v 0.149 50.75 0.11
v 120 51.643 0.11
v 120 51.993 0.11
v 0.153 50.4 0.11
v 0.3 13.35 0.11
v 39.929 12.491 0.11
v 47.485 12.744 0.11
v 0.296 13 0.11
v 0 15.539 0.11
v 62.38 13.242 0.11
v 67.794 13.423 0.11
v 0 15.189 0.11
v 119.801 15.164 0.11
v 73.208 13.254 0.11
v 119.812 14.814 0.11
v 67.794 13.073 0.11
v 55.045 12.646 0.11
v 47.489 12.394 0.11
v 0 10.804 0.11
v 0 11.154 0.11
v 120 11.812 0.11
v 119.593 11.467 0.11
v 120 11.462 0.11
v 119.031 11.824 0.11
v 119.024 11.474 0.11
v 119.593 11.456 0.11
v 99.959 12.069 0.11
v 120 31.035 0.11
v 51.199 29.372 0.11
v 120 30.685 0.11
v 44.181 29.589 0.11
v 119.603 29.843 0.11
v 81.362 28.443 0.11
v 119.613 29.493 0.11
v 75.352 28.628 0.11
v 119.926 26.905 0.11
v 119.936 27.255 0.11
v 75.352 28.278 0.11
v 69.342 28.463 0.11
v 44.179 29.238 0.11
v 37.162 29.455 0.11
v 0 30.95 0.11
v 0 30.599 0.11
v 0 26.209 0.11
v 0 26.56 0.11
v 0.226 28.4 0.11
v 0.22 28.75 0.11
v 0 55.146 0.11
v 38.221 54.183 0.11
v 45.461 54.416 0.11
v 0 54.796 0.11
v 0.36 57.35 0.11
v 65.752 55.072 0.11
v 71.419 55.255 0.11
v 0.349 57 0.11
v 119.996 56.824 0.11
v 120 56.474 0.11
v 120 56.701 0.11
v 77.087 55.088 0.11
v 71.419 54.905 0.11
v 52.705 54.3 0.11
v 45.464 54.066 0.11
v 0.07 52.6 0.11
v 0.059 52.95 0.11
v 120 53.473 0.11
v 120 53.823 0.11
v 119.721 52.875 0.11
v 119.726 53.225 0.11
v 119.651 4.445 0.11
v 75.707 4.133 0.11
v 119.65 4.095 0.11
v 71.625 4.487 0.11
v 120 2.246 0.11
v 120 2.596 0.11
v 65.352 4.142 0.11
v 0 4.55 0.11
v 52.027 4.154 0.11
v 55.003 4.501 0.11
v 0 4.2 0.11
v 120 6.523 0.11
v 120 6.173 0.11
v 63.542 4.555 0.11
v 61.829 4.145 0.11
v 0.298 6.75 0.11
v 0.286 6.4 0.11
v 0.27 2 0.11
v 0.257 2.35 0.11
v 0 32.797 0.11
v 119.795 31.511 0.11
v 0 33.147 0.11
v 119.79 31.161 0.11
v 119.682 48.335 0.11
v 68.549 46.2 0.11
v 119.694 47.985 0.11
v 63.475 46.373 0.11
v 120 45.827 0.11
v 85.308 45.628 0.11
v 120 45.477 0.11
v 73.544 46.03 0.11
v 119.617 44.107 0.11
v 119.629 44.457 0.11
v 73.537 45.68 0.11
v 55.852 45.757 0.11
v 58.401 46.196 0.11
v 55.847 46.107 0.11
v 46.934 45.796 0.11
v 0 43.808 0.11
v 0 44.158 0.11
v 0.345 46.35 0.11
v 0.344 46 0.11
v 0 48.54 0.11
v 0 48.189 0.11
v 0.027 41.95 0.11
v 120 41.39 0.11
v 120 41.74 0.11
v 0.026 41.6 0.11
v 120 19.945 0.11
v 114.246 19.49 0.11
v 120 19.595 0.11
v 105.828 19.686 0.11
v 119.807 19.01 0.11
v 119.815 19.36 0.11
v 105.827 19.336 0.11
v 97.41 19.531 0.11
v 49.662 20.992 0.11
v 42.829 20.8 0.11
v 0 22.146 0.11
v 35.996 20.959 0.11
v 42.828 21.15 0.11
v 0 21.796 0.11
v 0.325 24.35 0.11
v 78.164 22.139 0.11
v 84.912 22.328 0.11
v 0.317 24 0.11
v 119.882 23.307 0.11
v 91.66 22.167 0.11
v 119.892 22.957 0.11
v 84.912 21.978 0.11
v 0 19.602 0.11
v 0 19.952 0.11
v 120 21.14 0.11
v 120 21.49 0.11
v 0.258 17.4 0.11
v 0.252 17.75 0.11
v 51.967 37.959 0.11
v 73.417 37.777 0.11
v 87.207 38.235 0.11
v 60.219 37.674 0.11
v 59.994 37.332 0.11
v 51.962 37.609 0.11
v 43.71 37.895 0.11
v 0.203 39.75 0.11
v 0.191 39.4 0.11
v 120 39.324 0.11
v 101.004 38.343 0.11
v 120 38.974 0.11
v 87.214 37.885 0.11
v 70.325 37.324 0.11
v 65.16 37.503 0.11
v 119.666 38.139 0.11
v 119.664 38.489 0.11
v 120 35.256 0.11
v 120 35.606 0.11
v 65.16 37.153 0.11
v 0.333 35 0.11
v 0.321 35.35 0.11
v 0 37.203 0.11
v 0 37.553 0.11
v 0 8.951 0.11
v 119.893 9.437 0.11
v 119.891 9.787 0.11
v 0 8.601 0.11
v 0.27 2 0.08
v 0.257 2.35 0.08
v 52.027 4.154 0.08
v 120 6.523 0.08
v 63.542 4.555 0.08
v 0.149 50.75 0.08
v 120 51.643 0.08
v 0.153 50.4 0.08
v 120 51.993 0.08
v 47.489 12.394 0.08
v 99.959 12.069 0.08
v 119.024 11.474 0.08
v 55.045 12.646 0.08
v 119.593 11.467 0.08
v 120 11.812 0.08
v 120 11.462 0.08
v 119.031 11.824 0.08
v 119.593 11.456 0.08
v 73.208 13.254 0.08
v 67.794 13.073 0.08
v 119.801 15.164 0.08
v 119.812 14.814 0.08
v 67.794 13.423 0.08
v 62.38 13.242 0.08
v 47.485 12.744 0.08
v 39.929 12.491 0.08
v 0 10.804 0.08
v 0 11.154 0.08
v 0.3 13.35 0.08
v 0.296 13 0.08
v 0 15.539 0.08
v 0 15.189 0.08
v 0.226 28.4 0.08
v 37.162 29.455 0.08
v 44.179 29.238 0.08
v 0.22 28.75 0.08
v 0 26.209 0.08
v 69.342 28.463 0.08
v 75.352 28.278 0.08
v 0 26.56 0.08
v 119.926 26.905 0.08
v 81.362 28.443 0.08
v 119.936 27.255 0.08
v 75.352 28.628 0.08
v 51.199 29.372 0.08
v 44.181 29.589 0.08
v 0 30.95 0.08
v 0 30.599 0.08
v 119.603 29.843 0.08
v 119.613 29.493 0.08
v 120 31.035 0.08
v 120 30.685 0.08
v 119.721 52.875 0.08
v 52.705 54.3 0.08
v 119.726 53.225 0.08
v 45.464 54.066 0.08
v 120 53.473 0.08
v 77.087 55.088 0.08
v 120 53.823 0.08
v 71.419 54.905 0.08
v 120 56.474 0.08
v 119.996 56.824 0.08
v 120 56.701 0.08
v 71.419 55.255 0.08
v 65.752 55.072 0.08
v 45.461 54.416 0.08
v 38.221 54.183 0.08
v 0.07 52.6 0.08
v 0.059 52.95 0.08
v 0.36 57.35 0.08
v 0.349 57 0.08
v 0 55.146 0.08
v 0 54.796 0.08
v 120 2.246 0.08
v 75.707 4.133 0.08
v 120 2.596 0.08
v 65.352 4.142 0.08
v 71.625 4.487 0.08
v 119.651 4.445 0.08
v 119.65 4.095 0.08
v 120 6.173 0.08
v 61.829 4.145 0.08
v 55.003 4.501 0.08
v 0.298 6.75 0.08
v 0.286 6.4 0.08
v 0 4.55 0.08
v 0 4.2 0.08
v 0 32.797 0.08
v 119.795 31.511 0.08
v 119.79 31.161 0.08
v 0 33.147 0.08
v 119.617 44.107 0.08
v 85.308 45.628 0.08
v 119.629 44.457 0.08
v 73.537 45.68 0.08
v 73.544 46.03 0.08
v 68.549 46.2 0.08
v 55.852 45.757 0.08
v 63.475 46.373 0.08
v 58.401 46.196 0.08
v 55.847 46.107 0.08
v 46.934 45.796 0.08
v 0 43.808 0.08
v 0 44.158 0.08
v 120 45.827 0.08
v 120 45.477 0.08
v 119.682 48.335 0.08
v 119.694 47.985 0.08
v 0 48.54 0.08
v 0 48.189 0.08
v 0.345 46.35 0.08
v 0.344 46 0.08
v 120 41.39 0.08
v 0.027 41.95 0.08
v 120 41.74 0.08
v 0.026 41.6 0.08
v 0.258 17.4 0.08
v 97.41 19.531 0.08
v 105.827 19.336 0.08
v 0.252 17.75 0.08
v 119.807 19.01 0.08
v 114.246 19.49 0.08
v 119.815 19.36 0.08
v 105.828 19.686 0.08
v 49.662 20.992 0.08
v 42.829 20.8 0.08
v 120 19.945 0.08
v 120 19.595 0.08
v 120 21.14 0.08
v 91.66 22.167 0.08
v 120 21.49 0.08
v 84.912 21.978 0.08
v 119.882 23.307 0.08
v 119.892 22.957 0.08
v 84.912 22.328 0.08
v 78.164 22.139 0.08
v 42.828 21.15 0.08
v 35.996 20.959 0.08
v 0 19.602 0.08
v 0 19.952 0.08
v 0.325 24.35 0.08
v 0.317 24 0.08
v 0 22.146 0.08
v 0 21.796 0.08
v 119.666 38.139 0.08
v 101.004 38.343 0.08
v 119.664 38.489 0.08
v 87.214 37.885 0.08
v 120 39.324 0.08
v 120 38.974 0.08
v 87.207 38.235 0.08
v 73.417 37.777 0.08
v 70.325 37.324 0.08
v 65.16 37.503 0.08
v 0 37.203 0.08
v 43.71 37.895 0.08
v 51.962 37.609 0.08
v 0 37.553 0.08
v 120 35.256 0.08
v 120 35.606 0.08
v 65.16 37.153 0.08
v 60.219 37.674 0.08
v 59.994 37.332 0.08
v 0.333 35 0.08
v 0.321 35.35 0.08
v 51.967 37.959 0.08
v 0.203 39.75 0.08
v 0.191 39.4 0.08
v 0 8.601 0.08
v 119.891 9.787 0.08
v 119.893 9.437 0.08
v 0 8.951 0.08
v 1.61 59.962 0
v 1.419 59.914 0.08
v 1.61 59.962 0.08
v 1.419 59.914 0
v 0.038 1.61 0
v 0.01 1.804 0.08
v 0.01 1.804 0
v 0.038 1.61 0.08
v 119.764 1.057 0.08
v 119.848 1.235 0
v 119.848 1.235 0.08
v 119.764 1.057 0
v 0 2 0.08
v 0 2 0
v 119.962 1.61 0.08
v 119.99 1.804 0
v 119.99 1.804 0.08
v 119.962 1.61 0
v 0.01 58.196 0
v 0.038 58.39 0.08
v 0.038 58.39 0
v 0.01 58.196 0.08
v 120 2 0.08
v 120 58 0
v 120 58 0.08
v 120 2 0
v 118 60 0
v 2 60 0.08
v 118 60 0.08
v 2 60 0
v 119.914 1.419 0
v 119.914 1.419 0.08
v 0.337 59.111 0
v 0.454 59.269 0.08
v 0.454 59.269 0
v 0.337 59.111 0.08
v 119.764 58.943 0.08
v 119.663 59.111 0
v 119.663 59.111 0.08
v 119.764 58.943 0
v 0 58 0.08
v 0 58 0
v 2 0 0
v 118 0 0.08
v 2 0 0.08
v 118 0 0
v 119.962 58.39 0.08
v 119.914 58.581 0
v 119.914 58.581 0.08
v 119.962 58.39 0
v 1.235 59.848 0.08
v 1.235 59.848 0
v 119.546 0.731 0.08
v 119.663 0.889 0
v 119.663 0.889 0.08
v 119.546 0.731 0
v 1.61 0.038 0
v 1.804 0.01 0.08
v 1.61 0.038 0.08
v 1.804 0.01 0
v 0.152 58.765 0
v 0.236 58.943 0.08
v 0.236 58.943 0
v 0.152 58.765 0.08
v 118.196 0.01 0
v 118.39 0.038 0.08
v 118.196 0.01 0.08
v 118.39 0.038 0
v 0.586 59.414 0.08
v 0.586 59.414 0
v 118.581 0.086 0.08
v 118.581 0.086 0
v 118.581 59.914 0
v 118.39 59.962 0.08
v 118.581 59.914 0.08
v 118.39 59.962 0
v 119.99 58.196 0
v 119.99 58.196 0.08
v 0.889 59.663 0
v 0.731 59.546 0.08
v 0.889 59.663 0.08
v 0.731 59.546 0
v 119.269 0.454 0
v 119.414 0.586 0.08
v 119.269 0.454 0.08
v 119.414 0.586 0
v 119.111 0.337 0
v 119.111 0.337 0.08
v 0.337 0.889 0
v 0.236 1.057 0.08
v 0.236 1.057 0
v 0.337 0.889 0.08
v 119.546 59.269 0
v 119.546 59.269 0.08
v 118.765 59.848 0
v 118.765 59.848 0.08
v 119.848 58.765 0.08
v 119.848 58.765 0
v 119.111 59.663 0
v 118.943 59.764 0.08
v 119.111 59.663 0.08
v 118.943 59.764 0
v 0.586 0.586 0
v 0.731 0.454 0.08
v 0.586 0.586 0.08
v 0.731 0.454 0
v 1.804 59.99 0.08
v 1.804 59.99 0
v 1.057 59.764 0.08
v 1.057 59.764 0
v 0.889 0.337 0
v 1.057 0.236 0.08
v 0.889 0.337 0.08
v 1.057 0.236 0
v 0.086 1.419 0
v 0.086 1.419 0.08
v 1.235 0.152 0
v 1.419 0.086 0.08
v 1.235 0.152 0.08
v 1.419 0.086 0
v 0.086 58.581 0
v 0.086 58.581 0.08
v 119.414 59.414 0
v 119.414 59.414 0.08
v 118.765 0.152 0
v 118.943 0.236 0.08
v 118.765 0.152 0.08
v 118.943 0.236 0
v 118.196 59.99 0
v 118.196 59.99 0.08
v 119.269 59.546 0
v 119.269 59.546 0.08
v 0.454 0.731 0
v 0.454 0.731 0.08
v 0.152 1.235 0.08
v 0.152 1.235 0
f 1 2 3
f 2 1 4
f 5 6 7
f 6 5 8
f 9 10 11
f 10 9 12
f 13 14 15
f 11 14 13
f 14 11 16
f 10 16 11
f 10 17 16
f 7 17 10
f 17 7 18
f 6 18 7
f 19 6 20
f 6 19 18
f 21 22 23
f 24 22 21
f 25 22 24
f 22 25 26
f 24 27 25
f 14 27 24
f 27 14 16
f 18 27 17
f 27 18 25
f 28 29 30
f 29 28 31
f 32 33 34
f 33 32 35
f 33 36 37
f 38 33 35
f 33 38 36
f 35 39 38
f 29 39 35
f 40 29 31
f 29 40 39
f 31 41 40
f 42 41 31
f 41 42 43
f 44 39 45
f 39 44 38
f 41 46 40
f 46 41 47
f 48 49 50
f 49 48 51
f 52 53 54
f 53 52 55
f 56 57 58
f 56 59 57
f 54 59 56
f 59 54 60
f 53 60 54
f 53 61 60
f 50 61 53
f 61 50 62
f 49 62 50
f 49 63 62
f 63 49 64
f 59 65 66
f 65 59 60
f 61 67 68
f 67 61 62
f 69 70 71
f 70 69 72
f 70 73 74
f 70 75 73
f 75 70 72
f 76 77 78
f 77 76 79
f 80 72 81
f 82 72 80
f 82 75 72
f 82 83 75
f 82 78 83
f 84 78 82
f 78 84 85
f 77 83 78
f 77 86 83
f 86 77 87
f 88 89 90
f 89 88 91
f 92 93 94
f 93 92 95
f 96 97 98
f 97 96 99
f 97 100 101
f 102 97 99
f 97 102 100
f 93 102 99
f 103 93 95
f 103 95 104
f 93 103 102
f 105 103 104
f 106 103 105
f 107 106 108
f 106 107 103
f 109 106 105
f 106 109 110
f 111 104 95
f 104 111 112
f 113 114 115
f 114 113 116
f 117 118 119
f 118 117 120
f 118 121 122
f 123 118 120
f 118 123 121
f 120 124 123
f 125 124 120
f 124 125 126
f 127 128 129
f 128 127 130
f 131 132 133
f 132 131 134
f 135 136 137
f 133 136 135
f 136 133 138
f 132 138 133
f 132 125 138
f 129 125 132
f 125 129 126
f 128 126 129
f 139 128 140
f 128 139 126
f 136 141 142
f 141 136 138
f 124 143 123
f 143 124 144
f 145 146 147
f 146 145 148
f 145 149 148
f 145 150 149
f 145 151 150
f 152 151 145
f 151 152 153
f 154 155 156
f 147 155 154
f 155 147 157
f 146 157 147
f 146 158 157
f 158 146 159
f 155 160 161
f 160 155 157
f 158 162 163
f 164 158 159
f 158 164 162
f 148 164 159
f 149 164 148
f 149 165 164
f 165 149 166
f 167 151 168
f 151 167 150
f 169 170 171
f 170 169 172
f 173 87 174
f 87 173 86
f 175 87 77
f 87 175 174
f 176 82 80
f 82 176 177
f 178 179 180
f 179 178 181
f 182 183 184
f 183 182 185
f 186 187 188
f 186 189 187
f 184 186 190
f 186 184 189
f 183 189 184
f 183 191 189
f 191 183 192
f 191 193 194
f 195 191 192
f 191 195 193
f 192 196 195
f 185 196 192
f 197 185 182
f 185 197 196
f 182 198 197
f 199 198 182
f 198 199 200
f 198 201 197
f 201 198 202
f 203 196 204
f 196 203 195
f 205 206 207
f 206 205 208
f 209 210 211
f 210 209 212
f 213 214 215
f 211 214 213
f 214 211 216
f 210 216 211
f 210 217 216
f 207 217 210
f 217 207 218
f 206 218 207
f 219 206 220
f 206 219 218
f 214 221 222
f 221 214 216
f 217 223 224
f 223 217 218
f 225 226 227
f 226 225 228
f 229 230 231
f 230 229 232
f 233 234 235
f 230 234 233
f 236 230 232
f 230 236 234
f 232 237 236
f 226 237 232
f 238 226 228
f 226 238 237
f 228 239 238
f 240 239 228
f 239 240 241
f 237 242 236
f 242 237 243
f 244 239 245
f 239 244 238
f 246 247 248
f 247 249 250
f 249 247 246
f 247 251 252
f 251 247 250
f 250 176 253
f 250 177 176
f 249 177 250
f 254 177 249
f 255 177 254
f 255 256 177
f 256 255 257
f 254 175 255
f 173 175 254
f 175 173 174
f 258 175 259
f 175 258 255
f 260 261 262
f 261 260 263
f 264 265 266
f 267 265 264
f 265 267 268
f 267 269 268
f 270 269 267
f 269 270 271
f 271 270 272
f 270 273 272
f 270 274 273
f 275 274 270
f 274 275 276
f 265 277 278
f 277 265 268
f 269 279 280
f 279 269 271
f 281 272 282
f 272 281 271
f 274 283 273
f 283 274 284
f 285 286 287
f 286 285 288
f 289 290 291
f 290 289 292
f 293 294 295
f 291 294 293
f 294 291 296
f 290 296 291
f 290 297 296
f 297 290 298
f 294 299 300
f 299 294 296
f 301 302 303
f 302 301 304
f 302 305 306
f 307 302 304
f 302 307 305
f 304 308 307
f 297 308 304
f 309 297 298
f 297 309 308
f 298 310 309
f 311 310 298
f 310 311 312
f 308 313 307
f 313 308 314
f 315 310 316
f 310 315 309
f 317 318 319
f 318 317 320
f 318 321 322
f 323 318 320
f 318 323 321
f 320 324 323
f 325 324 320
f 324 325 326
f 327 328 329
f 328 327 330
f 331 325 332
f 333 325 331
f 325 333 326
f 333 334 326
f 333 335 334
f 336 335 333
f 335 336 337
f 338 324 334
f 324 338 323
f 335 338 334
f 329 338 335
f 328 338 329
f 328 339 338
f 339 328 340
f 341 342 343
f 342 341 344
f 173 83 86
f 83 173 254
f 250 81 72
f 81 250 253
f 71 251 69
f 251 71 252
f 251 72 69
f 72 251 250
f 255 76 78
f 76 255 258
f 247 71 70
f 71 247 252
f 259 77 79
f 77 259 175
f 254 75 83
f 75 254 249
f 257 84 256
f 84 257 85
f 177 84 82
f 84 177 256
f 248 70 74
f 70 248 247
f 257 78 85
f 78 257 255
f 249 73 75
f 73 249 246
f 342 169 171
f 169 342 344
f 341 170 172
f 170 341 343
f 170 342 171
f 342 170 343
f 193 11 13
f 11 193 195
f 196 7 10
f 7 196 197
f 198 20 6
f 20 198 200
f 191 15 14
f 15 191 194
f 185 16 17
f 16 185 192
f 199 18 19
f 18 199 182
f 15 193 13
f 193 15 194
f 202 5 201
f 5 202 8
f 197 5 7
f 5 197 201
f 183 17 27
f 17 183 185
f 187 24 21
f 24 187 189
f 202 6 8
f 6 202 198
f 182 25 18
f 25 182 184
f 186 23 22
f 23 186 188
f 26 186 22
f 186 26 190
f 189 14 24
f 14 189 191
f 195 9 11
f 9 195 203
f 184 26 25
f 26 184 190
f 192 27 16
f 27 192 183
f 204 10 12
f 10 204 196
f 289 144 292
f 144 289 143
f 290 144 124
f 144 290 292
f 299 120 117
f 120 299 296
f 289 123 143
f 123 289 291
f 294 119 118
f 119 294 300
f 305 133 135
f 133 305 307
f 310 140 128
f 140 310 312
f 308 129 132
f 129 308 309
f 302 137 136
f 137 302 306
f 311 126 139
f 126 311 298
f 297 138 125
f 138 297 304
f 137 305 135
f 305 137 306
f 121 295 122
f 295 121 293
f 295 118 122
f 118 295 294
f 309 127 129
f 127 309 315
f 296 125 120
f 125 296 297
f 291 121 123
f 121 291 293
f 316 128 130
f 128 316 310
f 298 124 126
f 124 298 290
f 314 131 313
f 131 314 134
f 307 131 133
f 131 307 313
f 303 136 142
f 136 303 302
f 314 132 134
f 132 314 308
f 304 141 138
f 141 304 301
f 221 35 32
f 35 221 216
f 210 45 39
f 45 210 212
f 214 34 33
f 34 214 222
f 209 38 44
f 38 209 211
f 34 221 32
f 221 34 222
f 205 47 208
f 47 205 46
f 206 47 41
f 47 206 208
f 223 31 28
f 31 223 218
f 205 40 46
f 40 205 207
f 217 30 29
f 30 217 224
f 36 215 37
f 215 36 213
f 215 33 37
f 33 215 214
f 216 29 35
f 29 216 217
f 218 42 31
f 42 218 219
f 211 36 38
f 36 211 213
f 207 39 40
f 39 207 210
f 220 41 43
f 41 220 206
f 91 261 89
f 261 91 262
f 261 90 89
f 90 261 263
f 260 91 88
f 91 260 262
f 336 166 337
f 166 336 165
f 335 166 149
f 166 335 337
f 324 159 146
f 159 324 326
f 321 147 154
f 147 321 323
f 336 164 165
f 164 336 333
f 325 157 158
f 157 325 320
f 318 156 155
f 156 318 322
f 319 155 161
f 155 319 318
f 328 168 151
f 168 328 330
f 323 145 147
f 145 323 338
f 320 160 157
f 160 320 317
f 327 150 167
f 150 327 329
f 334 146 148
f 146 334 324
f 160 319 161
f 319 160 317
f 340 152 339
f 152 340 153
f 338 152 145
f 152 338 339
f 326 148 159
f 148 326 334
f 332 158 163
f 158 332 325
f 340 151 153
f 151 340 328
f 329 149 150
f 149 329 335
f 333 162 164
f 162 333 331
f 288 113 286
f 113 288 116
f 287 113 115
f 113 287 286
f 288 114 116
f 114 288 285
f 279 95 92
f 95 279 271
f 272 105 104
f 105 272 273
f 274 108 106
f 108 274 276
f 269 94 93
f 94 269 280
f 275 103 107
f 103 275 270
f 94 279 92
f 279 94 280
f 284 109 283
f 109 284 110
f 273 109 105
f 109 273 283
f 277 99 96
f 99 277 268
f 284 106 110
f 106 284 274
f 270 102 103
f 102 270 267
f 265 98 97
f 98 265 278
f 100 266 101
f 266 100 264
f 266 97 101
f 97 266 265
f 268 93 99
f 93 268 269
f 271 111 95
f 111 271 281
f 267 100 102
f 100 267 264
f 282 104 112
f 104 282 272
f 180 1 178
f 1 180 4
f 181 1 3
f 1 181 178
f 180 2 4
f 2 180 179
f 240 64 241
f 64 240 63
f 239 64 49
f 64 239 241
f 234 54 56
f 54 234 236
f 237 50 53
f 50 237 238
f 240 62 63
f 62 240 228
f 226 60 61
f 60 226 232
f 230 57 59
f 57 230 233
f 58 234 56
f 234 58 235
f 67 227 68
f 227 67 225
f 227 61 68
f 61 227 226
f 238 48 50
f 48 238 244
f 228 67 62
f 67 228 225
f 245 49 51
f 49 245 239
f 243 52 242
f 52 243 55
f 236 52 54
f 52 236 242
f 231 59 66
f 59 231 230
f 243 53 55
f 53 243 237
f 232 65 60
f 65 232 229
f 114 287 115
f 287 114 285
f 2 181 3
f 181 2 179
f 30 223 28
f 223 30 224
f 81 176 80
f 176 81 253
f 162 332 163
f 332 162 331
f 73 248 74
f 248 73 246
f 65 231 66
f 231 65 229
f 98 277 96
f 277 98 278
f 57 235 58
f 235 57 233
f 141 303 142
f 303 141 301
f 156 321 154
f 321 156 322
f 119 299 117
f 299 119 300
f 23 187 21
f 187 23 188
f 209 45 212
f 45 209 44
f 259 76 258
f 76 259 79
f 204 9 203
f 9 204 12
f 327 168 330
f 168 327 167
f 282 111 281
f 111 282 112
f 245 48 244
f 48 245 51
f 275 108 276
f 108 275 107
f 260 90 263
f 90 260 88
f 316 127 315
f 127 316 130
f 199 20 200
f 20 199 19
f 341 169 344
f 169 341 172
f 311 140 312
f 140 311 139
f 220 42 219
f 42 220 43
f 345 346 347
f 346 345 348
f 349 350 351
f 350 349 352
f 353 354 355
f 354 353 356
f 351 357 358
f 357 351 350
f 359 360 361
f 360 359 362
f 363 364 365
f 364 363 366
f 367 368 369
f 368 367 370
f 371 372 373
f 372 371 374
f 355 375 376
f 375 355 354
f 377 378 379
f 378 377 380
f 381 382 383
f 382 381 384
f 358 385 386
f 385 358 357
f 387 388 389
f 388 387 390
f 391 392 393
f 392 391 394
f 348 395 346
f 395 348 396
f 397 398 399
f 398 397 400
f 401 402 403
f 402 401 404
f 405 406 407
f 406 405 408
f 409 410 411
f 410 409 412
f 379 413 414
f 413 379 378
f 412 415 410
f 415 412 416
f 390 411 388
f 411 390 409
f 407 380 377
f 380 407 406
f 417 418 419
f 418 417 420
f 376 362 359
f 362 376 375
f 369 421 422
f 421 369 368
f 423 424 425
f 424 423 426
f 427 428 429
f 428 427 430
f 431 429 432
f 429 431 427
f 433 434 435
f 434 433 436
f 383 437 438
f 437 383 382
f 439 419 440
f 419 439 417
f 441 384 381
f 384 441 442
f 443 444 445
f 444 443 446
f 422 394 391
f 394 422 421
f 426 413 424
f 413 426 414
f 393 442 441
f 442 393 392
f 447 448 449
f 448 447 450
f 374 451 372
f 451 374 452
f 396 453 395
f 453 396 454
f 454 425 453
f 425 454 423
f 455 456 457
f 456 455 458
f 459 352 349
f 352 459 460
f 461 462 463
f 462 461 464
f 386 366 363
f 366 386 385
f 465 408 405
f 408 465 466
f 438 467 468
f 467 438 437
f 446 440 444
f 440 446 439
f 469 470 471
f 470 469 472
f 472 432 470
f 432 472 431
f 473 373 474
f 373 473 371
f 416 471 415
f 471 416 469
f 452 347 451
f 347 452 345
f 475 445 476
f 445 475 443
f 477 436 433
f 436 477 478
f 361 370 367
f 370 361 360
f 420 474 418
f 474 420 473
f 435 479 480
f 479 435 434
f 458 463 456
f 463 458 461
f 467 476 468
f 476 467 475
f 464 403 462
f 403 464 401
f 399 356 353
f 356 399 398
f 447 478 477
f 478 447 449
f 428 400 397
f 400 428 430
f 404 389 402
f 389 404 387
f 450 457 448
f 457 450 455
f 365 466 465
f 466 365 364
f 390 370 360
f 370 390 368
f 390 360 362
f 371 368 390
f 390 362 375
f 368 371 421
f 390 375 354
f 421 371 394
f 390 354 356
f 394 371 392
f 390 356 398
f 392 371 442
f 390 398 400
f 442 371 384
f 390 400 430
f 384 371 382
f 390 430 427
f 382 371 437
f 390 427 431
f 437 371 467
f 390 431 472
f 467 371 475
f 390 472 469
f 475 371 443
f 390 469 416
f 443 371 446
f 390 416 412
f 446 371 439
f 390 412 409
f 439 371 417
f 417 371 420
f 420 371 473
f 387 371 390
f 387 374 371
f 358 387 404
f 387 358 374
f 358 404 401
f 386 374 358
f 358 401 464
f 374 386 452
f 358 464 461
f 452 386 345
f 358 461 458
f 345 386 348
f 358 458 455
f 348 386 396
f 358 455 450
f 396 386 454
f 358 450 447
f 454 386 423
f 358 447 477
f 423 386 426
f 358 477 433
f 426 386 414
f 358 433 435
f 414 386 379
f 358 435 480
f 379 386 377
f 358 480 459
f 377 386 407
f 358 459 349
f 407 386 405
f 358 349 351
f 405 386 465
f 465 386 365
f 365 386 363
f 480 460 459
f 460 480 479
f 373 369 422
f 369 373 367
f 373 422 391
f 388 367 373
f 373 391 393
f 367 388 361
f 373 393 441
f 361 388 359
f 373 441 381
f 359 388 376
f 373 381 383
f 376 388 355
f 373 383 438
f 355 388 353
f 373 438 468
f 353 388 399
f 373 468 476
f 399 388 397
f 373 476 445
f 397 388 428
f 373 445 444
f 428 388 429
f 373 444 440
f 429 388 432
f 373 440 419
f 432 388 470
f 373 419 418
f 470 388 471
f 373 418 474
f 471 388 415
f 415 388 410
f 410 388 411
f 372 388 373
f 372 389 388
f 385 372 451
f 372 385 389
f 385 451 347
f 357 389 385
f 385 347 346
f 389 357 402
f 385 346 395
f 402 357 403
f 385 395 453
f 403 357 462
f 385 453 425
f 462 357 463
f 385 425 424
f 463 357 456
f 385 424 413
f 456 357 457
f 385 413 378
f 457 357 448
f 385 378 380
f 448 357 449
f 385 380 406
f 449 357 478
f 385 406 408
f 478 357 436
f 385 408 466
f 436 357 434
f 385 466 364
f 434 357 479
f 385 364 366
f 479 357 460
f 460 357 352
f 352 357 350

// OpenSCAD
$fn=64;

length = 120;
width  = 60;
thickness = 0.08;

corner_r = 2;

wrinkle_amp = 0.35;
wrinkle_freq = 0.18;
wrinkle_phase = 0;

module rounded_sheet_2d(l, w, r){
    r2 = min(r, min(l,w)/2);
    hull(){
        translate([ r2, r2]) circle(r=r2);
        translate([l-r2, r2]) circle(r=r2);
        translate([ r2, w-r2]) circle(r=r2);
        translate([l-r2, w-r2]) circle(r=r2);
    }
}

module foil_tape(){
    // Base foil
    color([0.78,0.80,0.83])
    linear_extrude(height=thickness, convexity=10)
        rounded_sheet_2d(length, width, corner_r);

    // Subtle wrinkle ridges on top surface
    color([0.86,0.88,0.90], 0.85)
    translate([0,0,thickness])
    intersection(){
        linear_extrude(height=0.03, convexity=10)
            rounded_sheet_2d(length, width, corner_r);

        // Create a field of thin raised bands with slight waviness
        union(){
            for (y = [2 : 2.2 : width-2]){
                xoff = wrinkle_amp * sin((y*wrinkle_freq + wrinkle_phase) * 360);
                translate([xoff, y, 0])
                    rotate([0,0, 2*sin(y*0.12*360)])
                        cube([length, 0.35, 0.03], center=false);
            }
        }
    }

    // Slightly darker edge band to suggest cut edge
    color([0.65,0.67,0.70], 0.9)
    difference(){
        linear_extrude(height=thickness*0.6, convexity=10)
            rounded_sheet_2d(length, width, corner_r);
        translate([1.2,1.2,-0.1])
            linear_extrude(height=thickness, convexity=10)
                rounded_sheet_2d(length-2.4, width-2.4, max(0,corner_r-1));
    }
}

foil_tape();
